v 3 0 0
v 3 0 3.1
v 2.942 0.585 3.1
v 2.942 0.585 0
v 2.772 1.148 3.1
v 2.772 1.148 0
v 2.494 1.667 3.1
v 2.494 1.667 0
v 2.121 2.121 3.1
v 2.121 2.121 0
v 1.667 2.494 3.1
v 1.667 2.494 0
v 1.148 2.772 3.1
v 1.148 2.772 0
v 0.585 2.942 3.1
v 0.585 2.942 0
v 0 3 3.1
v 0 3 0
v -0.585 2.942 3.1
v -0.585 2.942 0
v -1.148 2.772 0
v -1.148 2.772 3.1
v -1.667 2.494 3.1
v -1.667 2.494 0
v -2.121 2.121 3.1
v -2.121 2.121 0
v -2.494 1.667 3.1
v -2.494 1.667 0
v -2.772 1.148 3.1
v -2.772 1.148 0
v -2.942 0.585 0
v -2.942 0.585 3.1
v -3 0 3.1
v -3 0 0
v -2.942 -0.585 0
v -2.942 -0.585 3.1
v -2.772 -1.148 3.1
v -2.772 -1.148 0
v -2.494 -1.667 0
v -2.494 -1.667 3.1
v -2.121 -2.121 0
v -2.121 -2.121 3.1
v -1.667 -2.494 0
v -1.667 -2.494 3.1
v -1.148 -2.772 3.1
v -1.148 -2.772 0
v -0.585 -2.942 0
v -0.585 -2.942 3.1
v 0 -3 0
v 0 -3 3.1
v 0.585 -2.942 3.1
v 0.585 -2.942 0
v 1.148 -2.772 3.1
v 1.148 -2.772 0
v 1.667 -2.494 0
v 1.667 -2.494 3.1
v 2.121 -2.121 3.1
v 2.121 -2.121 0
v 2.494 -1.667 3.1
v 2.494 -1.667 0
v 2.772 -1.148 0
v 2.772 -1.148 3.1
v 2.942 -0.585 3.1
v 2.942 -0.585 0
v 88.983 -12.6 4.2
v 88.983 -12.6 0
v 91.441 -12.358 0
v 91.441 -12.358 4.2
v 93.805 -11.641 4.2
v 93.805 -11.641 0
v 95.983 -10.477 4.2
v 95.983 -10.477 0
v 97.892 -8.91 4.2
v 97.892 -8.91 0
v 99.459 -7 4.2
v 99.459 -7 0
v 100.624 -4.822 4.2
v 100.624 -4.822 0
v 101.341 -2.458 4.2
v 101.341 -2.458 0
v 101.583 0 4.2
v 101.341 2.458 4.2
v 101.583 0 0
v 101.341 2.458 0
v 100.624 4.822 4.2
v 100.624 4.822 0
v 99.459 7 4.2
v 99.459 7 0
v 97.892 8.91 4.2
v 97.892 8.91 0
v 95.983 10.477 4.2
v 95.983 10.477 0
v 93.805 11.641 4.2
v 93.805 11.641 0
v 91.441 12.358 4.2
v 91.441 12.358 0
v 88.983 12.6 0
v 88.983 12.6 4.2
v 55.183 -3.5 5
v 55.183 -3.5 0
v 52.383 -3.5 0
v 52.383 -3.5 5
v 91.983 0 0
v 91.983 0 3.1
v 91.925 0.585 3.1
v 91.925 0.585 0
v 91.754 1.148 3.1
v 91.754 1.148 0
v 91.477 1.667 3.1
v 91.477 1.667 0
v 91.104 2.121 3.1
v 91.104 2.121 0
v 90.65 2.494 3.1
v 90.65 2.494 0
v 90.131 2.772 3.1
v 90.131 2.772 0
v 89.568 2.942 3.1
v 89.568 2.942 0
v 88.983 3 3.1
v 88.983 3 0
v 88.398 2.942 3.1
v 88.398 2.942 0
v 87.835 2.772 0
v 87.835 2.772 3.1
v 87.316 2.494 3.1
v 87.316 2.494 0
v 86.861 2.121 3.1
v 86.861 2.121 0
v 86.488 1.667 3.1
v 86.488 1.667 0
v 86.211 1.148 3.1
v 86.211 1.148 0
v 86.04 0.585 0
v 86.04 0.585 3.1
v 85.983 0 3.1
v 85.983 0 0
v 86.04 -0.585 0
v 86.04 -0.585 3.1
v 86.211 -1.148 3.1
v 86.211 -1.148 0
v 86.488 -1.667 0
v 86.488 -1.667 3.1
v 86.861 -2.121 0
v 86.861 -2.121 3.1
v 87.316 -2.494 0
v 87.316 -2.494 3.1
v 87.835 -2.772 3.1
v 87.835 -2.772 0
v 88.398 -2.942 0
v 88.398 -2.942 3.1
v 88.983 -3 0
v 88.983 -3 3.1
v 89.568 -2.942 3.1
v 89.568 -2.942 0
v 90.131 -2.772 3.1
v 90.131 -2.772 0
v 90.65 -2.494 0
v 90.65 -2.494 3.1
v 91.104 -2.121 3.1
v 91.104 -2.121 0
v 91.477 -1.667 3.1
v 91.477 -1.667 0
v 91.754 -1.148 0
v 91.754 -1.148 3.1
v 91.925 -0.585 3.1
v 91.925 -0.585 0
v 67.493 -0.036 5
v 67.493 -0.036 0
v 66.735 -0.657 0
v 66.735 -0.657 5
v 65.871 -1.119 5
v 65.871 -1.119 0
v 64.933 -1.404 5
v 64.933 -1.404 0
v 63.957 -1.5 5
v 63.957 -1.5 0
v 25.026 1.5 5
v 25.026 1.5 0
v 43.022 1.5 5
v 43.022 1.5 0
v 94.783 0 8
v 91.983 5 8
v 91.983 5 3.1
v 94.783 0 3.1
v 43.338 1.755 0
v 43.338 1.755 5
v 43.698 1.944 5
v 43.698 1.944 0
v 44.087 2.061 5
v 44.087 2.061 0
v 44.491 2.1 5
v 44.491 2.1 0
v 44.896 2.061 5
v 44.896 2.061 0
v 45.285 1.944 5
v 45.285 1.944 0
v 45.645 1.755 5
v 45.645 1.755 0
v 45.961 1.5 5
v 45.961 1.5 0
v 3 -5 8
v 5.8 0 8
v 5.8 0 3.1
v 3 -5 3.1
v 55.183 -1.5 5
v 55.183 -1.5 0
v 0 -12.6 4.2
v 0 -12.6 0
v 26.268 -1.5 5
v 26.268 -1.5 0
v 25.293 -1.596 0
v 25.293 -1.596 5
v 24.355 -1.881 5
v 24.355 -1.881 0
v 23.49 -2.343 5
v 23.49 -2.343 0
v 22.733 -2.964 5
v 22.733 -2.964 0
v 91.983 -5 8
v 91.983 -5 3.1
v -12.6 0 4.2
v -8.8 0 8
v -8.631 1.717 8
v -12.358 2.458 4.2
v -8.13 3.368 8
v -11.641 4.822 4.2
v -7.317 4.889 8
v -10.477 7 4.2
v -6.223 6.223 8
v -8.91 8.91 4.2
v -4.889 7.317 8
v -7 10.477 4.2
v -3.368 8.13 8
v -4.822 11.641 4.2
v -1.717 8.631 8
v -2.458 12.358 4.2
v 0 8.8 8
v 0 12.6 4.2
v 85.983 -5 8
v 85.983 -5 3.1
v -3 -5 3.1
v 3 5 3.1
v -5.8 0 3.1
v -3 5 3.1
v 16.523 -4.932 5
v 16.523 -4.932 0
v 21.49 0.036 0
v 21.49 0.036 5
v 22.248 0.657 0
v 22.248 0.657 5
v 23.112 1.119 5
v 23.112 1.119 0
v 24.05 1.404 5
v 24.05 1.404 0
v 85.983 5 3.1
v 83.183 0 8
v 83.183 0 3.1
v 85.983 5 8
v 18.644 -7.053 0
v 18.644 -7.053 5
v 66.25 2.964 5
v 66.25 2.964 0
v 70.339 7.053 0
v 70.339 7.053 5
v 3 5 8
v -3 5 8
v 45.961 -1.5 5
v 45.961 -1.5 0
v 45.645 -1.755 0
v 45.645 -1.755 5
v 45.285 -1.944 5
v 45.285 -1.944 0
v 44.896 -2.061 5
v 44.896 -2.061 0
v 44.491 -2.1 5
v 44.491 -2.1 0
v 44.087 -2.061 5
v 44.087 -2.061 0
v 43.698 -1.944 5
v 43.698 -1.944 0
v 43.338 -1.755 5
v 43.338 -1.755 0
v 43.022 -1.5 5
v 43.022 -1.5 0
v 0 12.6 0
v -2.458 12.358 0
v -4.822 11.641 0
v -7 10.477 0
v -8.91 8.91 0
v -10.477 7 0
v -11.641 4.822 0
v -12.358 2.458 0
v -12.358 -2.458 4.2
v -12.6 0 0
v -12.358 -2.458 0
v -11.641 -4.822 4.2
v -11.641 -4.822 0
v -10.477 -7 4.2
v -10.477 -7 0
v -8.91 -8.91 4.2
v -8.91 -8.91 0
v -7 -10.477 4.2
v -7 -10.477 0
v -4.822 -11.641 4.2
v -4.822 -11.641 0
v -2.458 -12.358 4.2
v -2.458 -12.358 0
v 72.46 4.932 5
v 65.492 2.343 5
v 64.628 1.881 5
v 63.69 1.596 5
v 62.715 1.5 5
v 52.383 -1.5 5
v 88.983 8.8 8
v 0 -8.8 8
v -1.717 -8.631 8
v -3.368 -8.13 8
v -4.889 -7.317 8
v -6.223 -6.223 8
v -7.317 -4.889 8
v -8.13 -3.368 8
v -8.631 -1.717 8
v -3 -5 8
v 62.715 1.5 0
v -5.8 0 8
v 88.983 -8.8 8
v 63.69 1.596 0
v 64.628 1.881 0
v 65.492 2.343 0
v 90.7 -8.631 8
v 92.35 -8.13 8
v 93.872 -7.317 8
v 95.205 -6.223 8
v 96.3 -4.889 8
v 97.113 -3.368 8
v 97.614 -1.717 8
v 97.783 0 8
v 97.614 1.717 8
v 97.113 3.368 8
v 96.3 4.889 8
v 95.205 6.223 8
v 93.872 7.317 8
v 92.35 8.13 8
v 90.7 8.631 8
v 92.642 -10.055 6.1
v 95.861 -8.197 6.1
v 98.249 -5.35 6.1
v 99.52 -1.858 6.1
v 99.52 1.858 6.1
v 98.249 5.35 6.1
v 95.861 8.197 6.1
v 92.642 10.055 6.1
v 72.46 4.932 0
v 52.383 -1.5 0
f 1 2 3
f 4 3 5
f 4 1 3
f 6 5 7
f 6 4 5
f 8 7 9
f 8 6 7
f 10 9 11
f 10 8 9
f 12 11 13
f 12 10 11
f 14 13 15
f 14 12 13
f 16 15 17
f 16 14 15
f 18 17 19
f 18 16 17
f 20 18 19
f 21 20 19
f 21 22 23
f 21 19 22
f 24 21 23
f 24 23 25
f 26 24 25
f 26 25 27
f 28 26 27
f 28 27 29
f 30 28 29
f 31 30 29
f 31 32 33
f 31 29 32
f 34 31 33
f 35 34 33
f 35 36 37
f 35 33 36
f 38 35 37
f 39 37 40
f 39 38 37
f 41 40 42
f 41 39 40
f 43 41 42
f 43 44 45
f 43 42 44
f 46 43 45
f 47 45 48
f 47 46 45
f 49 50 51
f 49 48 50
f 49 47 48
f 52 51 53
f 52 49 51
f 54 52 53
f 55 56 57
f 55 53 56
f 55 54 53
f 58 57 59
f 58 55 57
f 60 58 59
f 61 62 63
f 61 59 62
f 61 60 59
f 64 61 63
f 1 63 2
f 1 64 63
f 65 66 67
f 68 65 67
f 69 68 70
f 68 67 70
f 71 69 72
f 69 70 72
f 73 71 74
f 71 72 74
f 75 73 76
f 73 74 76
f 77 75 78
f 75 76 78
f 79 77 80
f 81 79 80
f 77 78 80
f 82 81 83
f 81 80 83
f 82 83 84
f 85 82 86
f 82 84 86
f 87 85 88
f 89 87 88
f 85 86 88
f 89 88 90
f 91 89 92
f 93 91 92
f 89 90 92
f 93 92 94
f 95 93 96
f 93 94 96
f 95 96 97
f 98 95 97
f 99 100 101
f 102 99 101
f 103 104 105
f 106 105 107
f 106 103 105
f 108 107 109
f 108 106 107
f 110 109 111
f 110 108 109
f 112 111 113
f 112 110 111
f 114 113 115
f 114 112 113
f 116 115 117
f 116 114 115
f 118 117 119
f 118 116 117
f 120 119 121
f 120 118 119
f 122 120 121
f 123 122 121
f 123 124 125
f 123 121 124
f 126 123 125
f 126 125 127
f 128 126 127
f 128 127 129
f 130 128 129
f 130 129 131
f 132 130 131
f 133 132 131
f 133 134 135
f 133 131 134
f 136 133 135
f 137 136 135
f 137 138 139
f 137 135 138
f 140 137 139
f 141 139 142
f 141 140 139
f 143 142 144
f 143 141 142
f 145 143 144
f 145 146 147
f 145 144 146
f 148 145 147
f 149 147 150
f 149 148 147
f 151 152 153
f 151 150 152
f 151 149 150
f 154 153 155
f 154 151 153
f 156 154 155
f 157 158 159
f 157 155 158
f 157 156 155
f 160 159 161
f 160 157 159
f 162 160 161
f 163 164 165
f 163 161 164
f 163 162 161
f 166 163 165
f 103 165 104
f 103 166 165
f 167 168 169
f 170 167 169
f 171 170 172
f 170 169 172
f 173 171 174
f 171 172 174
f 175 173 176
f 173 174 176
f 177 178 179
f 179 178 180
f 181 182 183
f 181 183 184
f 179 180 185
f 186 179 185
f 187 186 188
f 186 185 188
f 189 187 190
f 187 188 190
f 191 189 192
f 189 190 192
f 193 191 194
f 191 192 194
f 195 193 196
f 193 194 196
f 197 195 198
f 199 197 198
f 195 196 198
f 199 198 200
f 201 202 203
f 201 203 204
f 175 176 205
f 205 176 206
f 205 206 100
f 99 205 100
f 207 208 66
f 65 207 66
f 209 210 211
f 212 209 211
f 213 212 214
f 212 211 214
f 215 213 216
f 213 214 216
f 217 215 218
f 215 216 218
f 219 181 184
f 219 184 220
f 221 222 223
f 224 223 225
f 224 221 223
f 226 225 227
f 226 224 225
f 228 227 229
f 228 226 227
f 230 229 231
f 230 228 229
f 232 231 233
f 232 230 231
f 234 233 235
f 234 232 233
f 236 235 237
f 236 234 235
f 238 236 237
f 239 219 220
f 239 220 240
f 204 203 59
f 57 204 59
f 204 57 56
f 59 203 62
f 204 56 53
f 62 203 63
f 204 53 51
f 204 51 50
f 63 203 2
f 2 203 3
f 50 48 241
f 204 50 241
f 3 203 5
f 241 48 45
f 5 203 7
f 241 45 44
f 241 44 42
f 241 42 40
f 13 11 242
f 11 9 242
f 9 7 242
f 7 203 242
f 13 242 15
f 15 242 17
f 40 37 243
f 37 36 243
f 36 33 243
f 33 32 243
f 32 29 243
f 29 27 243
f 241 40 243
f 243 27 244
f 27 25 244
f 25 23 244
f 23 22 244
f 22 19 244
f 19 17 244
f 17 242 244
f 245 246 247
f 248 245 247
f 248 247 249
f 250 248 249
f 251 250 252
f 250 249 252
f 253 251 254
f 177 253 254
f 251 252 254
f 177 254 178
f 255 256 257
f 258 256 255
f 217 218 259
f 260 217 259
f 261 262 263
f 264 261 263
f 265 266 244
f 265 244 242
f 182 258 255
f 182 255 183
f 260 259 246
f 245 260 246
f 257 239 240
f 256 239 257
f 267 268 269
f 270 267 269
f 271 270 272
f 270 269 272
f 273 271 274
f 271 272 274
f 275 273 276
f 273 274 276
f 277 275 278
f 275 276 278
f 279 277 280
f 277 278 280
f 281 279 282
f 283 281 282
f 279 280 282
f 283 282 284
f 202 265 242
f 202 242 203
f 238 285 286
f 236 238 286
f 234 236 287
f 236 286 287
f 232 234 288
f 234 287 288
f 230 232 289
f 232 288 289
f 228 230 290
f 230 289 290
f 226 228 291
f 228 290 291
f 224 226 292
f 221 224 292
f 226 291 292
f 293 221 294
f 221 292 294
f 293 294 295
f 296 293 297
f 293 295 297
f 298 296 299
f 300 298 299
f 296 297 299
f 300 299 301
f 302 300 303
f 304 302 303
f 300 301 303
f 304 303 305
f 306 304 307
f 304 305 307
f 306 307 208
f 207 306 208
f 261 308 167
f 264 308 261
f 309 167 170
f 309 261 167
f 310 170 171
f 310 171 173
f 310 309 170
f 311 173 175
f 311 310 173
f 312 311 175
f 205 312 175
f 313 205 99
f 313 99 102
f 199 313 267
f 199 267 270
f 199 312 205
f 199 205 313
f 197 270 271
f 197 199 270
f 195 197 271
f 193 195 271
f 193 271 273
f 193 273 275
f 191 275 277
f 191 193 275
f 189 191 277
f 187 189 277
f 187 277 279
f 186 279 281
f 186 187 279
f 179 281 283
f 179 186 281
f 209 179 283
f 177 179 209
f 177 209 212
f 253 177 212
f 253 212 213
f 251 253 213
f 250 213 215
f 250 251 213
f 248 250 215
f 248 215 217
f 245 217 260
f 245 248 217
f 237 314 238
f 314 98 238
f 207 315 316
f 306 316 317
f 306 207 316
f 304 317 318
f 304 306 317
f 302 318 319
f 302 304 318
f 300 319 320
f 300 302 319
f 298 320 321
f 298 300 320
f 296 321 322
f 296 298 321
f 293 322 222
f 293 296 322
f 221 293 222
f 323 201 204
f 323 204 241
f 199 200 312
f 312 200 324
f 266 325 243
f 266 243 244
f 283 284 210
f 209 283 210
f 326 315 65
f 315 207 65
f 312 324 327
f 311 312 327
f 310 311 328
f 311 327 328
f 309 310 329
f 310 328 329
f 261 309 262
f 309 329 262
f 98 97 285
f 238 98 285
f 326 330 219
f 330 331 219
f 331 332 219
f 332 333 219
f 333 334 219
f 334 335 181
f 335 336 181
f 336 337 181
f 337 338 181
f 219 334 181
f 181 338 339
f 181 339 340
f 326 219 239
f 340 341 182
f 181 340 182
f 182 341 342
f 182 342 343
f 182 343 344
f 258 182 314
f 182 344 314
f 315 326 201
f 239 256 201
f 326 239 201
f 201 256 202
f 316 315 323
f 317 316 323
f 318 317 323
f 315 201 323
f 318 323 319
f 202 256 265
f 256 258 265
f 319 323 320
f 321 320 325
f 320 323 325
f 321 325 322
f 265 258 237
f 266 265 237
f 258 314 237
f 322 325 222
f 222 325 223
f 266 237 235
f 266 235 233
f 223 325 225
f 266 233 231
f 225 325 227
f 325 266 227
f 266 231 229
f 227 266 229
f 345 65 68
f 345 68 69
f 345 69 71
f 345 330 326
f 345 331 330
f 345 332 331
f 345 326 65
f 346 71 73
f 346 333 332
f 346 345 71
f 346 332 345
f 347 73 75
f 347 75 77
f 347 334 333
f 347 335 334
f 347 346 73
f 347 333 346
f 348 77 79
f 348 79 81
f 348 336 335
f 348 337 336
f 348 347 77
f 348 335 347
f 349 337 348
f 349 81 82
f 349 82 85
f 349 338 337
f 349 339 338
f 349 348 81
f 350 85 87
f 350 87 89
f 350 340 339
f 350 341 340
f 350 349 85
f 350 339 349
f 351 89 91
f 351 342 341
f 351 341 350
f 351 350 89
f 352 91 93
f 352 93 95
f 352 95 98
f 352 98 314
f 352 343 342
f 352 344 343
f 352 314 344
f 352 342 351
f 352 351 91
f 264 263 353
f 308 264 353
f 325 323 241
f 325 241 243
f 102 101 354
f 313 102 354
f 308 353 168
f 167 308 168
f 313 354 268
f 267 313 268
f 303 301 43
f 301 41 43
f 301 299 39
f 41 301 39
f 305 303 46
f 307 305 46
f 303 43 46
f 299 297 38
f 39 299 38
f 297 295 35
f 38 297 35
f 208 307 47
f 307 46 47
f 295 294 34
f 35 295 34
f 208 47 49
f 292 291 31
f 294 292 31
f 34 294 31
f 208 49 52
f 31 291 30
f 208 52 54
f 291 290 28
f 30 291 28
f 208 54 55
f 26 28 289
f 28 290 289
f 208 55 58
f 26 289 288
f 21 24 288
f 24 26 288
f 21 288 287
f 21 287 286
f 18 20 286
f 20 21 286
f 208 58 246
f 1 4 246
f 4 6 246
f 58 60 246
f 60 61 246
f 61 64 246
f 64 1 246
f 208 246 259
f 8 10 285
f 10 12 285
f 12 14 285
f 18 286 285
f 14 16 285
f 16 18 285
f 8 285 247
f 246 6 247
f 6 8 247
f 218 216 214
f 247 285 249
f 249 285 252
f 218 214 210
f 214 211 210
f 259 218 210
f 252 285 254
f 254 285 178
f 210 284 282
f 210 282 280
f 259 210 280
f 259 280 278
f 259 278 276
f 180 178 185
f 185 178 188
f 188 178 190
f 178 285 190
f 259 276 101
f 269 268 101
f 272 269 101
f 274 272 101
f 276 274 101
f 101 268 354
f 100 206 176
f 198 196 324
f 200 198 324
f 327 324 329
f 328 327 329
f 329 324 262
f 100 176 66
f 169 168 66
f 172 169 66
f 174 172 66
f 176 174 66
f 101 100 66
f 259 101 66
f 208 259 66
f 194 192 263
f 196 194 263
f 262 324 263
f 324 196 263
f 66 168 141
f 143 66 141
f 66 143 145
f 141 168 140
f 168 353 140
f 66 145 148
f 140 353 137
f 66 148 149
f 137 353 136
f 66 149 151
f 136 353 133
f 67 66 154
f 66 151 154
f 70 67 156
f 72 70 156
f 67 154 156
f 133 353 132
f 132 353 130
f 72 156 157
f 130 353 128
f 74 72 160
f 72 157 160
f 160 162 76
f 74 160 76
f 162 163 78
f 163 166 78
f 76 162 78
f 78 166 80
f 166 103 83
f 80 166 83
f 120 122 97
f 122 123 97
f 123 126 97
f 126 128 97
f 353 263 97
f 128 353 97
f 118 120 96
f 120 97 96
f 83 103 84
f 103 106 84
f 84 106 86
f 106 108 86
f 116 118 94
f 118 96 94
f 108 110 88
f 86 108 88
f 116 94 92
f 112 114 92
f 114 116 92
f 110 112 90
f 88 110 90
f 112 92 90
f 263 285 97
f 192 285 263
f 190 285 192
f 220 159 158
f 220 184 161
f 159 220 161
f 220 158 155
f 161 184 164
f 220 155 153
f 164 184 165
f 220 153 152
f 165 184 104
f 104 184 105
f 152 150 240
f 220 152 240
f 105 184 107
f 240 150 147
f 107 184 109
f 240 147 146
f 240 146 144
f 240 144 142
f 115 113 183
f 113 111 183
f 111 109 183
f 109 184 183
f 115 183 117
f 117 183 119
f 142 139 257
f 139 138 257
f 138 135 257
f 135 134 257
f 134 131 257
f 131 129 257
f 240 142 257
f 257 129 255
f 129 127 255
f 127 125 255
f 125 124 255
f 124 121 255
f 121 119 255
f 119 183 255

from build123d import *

# Parameters (mm, degrees)
BOSS_EXTRUDE1_DEPTH  = 4.5
BOSS_EXTRUDE2_DEPTH  = 4
CHAMFER2_2_DEPTH     = 4.2
CHAMFER2_START       = 4.2
CHAMFER2_3_OUTLINE_R = 8.8
CHAMFER2_3_DEPTH     = 3.8
SKETCH4_R            = 3
CUT_EXTRUDE1_DEPTH   = 103.673405573
CUT_EXTRUDE2_DEPTH   = 4.9
CUT_EXTRUDE3_DEPTH   = 5


with BuildPart() as part:
    # Sketch2 → Boss-Extrude1 (new body)
    with BuildSketch(Plane.XY):
        with BuildLine():
            Line((0, 12.6), (88.98281443, 12.6))
            ThreePointArc((88.98281443, 12.6), (101.58281443, 0), (88.98281443, -12.6))
            Line((88.98281443, -12.6), (0, -12.6))
            ThreePointArc((0, -12.6), (-12.6, 0), (0, 12.6))
        make_face()
    extrude(amount=BOSS_EXTRUDE1_DEPTH)

    # Sketch3 → Boss-Extrude2 (add)
    with BuildSketch(Plane.XY.offset(8)):
        with BuildLine():
            Line((-0.708592785, -8.85), (89.691407215, -8.85))
            ThreePointArc((89.691407215, -8.85), (98.541407215, 0), (89.691407215, 8.85))
            Line((89.691407215, 8.85), (-0.708592785, 8.85))
            ThreePointArc((-0.708592785, 8.85), (-9.558592785, 0), (-0.708592785, -8.85))
        make_face()
    extrude(amount=-BOSS_EXTRUDE2_DEPTH)

    # Chamfer2: read off the stored shape, not the designer's step
    # Chamfer2 outline → Chamfer2 (revolve)
    with BuildSketch(Plane(origin=(88.98281443, 0, 0), x_dir=(1, 0, 0), z_dir=(0, -1, 0))):
        Polygon((12.6, 4.2), (8.8, 8), (8.8, 4.2), align=None)
    revolve(axis=Axis((88.98281443, 0, 0), (0, 0, 1)))

    # Chamfer2 2 outline → Chamfer2 2 (add)
    with BuildSketch(Plane.XY):
        with BuildLine():
            ThreePointArc((0, 12.6), (-12.6, 0), (0, -12.6))
            Line((0, -12.6), (88.98281443, -12.6))
            ThreePointArc((88.98281443, -12.6), (101.58281443, 0), (88.98281443, 12.6))
            Line((88.98281443, 12.6), (0, 12.6))
        make_face()
    extrude(amount=CHAMFER2_2_DEPTH)

    # Chamfer2 3 outline → Chamfer2 3 (add)
    with BuildSketch(Plane.XY.offset(CHAMFER2_START)):
        with Locations((88.98281443, 0)):
            Circle(CHAMFER2_3_OUTLINE_R)
    extrude(amount=CHAMFER2_3_DEPTH)

    # Chamfer2 4: loft between two sections, ruled curve by curve
    chamfer2_4_from = [
        Edge.make_three_point_arc((0, -8.8, 8), (-6.222539674, -6.222539674, 8), (-8.8, 0, 8)),
        Edge.make_three_point_arc((-8.8, 0, 8), (-6.222539674, 6.222539674, 8), (0, 8.8, 8)),
        Edge.make_line((88.98281443, 8.8, 8), (0, 8.8, 8)),
        Edge.make_line((0, -8.8, 8), (88.98281443, -8.8, 8)),
        Edge.make_line((88.98281443, -8.8, 8), (88.98281443, 8.8, 8)),
    ]
    chamfer2_4_to = [
        Edge.make_three_point_arc((0, -12.6, 4.2), (-8.909545443, -8.909545443, 4.2), (-12.6, 0, 4.2)),
        Edge.make_three_point_arc((-12.6, 0, 4.2), (-8.909545443, 8.909545443, 4.2), (0, 12.6, 4.2)),
        Edge.make_line((88.98281443, 12.6, 4.2), (0, 12.6, 4.2)),
        Edge.make_line((0, -12.6, 4.2), (88.98281443, -12.6, 4.2)),
        Edge.make_line((88.98281443, -12.6, 4.2), (88.98281443, 12.6, 4.2)),
    ]
    chamfer2_4 = Solid(Shell([*[Face.make_surface_from_curves(chamfer2_4_from[k], chamfer2_4_to[k]) for k in range(5)], Face(Wire(chamfer2_4_from)), Face(Wire(chamfer2_4_to))]))
    add(chamfer2_4)

    # Sketch4 → Cut-Extrude1 (cut, through all)
    with BuildSketch(Plane.XY):
        with Locations((88.98281443, 0)):
            Circle(SKETCH4_R)
        Circle(SKETCH4_R)
    extrude(amount=CUT_EXTRUDE1_DEPTH, mode=Mode.SUBTRACT)

    # Sketch5 → Cut-Extrude2 (cut)
    with BuildSketch(Plane.XY.offset(8)):
        Polygon((3, -5), (-3, -5), (-5.8, 0), (-3, 5), (3, 5), (5.8, 0), align=None)
        Polygon((83.18281443, 0), (85.98281443, 5), (91.98281443, 5), (94.78281443, 0), (91.98281443, -5), (85.98281443, -5), align=None)
    extrude(amount=-CUT_EXTRUDE2_DEPTH, mode=Mode.SUBTRACT)

    # Sketch6 → Cut-Extrude3 (cut)
    with BuildSketch(Plane.XY):
        with BuildLine():
            Line((70.338627057, 7.052928589), (72.459947401, 4.931608246))
            Line((72.459947401, 4.931608246), (67.492805249, -0.035533906))
            ThreePointArc((67.492805249, -0.035533906), (65.870688505, -1.119397663), (63.957271343, -1.5))
            Line((63.957271343, -1.5), (55.182814215, -1.5))
            Line((55.182814215, -1.5), (55.182814215, -3.5))
            Line((55.182814215, -3.5), (52.382814215, -3.5))
            Line((52.382814215, -3.5), (52.382814215, -1.5))
            Line((52.382814215, -1.5), (45.961101061, -1.5))
            ThreePointArc((45.961101061, -1.5), (44.491407215, -2.1), (43.021713369, -1.5))
            Line((43.021713369, -1.5), (26.268183774, -1.5))
            ThreePointArc((26.268183774, -1.5), (24.354766612, -1.880602337), (22.732649868, -2.964466094))
            Line((22.732649868, -2.964466094), (18.644187373, -7.052928589))
            Line((18.644187373, -7.052928589), (16.522867029, -4.931608246))
            Line((16.522867029, -4.931608246), (21.490009181, 0.035533906))
            ThreePointArc((21.490009181, 0.035533906), (23.112125925, 1.119397663), (25.025543087, 1.5))
            Line((25.025543087, 1.5), (43.021713369, 1.5))
            ThreePointArc((43.021713369, 1.5), (44.491407215, 2.1), (45.961101061, 1.5))
            Line((45.961101061, 1.5), (62.714630656, 1.5))
            ThreePointArc((62.714630656, 1.5), (64.628047818, 1.880602337), (66.250164562, 2.964466094))
            Line((66.250164562, 2.964466094), (70.338627057, 7.052928589))
        make_face()
    extrude(amount=CUT_EXTRUDE3_DEPTH, mode=Mode.SUBTRACT)


solid = part.part
